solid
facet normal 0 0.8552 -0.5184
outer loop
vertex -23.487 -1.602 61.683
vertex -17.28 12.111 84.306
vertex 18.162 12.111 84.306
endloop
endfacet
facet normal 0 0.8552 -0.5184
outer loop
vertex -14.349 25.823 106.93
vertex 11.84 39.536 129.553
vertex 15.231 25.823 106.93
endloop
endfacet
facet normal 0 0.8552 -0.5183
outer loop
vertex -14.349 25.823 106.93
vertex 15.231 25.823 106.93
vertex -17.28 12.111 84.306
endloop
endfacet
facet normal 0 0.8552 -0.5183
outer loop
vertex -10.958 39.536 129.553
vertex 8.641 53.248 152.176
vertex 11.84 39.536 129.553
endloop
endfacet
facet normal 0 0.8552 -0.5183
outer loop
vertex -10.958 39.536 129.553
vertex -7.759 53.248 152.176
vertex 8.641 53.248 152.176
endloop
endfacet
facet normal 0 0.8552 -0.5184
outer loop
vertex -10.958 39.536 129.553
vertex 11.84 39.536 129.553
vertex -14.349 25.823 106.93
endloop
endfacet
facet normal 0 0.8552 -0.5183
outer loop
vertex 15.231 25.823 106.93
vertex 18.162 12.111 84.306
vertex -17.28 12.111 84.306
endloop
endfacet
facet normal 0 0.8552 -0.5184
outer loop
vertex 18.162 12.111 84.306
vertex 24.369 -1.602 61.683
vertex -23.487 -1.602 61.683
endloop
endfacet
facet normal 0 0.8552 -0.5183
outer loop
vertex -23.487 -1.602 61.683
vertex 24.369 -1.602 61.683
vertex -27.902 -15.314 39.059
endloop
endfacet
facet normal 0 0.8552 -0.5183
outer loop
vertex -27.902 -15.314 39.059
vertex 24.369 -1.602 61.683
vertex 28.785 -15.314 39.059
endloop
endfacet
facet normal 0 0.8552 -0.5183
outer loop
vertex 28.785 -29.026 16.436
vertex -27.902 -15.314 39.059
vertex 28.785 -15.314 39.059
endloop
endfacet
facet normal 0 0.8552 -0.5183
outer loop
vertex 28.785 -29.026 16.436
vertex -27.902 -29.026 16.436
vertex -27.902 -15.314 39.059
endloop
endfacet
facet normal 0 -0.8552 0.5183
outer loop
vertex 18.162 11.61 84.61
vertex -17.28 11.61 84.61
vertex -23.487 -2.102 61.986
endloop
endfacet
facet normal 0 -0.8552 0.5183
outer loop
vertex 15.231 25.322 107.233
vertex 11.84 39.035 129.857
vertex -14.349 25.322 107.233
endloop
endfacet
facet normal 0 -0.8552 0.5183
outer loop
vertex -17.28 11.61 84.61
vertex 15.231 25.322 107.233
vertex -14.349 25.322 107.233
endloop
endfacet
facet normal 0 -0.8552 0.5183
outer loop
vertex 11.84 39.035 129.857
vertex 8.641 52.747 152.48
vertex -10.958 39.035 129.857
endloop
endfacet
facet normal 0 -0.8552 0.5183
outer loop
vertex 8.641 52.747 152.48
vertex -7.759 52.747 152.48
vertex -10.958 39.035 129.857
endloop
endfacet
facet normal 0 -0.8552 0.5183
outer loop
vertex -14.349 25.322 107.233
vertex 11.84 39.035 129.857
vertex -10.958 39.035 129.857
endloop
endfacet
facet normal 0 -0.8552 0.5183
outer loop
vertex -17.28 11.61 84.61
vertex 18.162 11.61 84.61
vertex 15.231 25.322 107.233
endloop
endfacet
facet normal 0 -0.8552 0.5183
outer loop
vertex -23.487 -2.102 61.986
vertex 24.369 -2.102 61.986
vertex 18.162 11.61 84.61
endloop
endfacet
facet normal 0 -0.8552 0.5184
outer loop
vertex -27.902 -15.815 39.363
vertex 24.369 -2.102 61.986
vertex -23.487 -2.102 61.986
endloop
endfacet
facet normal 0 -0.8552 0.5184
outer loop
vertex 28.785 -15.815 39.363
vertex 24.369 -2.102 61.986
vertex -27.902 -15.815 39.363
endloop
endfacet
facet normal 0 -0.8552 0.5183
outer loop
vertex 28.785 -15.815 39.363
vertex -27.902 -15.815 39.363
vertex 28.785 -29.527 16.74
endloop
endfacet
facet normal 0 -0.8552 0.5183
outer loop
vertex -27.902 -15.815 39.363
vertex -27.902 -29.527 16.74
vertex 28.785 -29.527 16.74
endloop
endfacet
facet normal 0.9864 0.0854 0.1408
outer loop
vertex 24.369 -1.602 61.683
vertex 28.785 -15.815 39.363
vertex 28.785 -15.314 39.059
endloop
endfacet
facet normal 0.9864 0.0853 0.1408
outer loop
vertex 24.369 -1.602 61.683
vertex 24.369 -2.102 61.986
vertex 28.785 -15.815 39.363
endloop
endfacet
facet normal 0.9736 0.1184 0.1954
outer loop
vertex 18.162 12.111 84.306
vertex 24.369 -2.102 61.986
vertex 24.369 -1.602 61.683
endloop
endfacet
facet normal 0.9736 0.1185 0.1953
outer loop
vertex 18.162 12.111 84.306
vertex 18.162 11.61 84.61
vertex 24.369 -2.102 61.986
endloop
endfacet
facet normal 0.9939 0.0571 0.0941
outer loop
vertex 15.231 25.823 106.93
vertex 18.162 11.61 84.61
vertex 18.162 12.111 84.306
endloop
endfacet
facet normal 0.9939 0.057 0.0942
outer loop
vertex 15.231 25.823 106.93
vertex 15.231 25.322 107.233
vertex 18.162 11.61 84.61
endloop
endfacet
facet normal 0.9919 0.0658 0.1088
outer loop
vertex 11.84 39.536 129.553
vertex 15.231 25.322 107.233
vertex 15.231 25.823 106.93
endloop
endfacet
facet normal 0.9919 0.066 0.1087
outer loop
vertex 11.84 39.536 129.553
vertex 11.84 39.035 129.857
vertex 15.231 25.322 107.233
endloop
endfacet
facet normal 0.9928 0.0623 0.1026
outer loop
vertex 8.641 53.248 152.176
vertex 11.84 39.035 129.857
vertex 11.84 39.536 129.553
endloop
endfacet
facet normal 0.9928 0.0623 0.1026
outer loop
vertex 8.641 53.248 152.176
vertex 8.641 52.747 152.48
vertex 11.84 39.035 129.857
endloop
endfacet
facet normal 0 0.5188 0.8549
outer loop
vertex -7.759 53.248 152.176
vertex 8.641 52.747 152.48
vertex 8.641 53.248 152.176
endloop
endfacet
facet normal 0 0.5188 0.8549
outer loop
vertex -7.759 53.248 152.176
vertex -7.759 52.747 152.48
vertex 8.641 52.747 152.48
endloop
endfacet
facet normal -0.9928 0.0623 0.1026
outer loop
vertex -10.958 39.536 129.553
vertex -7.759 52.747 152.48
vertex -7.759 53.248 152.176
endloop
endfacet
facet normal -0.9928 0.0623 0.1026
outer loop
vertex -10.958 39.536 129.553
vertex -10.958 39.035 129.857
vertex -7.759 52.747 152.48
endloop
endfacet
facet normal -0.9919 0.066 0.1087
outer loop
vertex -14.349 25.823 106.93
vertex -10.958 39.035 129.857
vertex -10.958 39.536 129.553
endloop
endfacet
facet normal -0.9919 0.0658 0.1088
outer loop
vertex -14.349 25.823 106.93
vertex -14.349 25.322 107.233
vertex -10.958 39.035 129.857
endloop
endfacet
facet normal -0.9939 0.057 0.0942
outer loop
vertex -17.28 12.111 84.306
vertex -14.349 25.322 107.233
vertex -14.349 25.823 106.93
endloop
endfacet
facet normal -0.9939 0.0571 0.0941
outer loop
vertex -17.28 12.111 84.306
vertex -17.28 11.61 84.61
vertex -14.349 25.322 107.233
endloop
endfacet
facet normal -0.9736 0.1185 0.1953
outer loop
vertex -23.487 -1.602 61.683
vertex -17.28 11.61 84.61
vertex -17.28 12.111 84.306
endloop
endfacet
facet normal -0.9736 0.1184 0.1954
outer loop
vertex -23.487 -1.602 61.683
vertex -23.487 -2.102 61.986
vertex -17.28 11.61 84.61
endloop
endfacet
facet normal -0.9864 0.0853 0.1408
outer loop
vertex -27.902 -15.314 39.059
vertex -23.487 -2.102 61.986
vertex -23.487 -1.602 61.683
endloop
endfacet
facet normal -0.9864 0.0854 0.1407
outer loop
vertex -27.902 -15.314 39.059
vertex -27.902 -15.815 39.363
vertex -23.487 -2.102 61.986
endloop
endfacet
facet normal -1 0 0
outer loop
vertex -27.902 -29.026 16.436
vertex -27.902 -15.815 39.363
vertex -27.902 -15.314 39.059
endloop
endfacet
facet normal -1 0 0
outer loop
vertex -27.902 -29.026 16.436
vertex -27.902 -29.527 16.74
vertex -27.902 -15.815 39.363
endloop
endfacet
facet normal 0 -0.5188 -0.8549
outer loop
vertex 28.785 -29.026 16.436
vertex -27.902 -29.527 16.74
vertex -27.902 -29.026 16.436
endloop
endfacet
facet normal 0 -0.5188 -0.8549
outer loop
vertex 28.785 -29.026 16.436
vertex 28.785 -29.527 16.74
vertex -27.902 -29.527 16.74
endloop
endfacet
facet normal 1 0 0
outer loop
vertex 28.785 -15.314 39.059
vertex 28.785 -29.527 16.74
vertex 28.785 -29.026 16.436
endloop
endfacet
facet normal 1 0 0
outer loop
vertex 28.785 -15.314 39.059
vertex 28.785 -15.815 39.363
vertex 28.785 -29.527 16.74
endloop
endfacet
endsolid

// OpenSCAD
// sb_harp_white_wood_02
// Soundboard face "harp_white_wood_02".
// CONSTRUCTION: flat plate -> linear_extrude of the footprint outline.
// Justification (from analysis JSON):
//   obb_dims = [158.73, 56.69, 0.586]  ->  one dimension (0.586) is ~100x
//   smaller than the other two  =>  thin flat plate.
//   The thin axis is OBB axis 2 = principal axis e2 (the local v / thickness
//   direction). The broad face spans OBB axis 0 (=e0, local w, the long axis,
//   sectioned at s) and principal axis e1 (local u, the width).
//   Cross-sections are NOT rectangular: the half-width in u tapers from
//   +/-28.34 at the base down to +/-8.2 at the tip (a fan/wedge), so we
//   build the (u,w) footprint polygon and extrude it by the measured thickness.

module sb_harp_white_wood_02() {
    // ---- principal frame (from JSON: e0, e1, e2 + centroid) ----
    // multmatrix columns = [e1, e2, e0, centroid]; local (x=u, y=v, z=w).
    e0 = [4.474615656687517e-08, 0.5183353942269119,  0.8551774196572486];
    e1 = [0.9999999999999879,   -1.4964715064137968e-07, 3.8379472494624116e-08];
    e2 = [1.4786830315027656e-07, 0.8551774196572364, -0.5183353942269123];
    centroid = [0.44120035460671436, -0.16629279995937019, 64.67363399367734];

    // ---- key dimensions ----
    thickness = 0.5855388569197899;   // obb_dims[2] = plate thickness (v / e2)
    v_mid     = 0.03;                 // mean v offset of the broad face (~0.0..0.06)

    // Footprint outline in the (u, w) plane: [half_width_u, w_position].
    // half_width_u = max |e1-coord| per section; w_position = section s.
    hw = [ [28.343660,  -56.210922],   // base
           [28.343660,  -29.756280],
           [23.927787,   -3.301638],
           [17.721288,   23.153004],
           [14.789847,   49.607646],
           [11.399227,   76.062288],
           [ 8.199973,  102.516930] ]; // tip

    // Build the symmetric footprint: up the +u edge (base->tip), down the -u edge.
    foot_pos = [ for (p = hw) [ p[0], p[1] ] ];                 // x=u, y=w
    foot_neg = [ for (i = [len(hw)-1 : -1 : 0]) [ -hw[i][0], hw[i][1] ] ];
    footprint = concat(foot_pos, foot_neg);

    multmatrix([
        [e1[0], e2[0], e0[0], centroid[0]],
        [e1[1], e2[1], e0[1], centroid[1]],
        [e1[2], e2[2], e0[2], centroid[2]],
        [0,     0,     0,     1]
    ])
    // Extrude the (u,w) footprint by the thickness along local v (y).
    // rotate maps the 2D polygon plane (x=u, y=w) to (x=u, z=w) and the
    // extrude/thickness axis (z) to local y = v.
    translate([0, v_mid, 0])
        rotate([90, 0, 0])
            linear_extrude(height = thickness, center = true)
                polygon(points = footprint);
}

sb_harp_white_wood_02();
